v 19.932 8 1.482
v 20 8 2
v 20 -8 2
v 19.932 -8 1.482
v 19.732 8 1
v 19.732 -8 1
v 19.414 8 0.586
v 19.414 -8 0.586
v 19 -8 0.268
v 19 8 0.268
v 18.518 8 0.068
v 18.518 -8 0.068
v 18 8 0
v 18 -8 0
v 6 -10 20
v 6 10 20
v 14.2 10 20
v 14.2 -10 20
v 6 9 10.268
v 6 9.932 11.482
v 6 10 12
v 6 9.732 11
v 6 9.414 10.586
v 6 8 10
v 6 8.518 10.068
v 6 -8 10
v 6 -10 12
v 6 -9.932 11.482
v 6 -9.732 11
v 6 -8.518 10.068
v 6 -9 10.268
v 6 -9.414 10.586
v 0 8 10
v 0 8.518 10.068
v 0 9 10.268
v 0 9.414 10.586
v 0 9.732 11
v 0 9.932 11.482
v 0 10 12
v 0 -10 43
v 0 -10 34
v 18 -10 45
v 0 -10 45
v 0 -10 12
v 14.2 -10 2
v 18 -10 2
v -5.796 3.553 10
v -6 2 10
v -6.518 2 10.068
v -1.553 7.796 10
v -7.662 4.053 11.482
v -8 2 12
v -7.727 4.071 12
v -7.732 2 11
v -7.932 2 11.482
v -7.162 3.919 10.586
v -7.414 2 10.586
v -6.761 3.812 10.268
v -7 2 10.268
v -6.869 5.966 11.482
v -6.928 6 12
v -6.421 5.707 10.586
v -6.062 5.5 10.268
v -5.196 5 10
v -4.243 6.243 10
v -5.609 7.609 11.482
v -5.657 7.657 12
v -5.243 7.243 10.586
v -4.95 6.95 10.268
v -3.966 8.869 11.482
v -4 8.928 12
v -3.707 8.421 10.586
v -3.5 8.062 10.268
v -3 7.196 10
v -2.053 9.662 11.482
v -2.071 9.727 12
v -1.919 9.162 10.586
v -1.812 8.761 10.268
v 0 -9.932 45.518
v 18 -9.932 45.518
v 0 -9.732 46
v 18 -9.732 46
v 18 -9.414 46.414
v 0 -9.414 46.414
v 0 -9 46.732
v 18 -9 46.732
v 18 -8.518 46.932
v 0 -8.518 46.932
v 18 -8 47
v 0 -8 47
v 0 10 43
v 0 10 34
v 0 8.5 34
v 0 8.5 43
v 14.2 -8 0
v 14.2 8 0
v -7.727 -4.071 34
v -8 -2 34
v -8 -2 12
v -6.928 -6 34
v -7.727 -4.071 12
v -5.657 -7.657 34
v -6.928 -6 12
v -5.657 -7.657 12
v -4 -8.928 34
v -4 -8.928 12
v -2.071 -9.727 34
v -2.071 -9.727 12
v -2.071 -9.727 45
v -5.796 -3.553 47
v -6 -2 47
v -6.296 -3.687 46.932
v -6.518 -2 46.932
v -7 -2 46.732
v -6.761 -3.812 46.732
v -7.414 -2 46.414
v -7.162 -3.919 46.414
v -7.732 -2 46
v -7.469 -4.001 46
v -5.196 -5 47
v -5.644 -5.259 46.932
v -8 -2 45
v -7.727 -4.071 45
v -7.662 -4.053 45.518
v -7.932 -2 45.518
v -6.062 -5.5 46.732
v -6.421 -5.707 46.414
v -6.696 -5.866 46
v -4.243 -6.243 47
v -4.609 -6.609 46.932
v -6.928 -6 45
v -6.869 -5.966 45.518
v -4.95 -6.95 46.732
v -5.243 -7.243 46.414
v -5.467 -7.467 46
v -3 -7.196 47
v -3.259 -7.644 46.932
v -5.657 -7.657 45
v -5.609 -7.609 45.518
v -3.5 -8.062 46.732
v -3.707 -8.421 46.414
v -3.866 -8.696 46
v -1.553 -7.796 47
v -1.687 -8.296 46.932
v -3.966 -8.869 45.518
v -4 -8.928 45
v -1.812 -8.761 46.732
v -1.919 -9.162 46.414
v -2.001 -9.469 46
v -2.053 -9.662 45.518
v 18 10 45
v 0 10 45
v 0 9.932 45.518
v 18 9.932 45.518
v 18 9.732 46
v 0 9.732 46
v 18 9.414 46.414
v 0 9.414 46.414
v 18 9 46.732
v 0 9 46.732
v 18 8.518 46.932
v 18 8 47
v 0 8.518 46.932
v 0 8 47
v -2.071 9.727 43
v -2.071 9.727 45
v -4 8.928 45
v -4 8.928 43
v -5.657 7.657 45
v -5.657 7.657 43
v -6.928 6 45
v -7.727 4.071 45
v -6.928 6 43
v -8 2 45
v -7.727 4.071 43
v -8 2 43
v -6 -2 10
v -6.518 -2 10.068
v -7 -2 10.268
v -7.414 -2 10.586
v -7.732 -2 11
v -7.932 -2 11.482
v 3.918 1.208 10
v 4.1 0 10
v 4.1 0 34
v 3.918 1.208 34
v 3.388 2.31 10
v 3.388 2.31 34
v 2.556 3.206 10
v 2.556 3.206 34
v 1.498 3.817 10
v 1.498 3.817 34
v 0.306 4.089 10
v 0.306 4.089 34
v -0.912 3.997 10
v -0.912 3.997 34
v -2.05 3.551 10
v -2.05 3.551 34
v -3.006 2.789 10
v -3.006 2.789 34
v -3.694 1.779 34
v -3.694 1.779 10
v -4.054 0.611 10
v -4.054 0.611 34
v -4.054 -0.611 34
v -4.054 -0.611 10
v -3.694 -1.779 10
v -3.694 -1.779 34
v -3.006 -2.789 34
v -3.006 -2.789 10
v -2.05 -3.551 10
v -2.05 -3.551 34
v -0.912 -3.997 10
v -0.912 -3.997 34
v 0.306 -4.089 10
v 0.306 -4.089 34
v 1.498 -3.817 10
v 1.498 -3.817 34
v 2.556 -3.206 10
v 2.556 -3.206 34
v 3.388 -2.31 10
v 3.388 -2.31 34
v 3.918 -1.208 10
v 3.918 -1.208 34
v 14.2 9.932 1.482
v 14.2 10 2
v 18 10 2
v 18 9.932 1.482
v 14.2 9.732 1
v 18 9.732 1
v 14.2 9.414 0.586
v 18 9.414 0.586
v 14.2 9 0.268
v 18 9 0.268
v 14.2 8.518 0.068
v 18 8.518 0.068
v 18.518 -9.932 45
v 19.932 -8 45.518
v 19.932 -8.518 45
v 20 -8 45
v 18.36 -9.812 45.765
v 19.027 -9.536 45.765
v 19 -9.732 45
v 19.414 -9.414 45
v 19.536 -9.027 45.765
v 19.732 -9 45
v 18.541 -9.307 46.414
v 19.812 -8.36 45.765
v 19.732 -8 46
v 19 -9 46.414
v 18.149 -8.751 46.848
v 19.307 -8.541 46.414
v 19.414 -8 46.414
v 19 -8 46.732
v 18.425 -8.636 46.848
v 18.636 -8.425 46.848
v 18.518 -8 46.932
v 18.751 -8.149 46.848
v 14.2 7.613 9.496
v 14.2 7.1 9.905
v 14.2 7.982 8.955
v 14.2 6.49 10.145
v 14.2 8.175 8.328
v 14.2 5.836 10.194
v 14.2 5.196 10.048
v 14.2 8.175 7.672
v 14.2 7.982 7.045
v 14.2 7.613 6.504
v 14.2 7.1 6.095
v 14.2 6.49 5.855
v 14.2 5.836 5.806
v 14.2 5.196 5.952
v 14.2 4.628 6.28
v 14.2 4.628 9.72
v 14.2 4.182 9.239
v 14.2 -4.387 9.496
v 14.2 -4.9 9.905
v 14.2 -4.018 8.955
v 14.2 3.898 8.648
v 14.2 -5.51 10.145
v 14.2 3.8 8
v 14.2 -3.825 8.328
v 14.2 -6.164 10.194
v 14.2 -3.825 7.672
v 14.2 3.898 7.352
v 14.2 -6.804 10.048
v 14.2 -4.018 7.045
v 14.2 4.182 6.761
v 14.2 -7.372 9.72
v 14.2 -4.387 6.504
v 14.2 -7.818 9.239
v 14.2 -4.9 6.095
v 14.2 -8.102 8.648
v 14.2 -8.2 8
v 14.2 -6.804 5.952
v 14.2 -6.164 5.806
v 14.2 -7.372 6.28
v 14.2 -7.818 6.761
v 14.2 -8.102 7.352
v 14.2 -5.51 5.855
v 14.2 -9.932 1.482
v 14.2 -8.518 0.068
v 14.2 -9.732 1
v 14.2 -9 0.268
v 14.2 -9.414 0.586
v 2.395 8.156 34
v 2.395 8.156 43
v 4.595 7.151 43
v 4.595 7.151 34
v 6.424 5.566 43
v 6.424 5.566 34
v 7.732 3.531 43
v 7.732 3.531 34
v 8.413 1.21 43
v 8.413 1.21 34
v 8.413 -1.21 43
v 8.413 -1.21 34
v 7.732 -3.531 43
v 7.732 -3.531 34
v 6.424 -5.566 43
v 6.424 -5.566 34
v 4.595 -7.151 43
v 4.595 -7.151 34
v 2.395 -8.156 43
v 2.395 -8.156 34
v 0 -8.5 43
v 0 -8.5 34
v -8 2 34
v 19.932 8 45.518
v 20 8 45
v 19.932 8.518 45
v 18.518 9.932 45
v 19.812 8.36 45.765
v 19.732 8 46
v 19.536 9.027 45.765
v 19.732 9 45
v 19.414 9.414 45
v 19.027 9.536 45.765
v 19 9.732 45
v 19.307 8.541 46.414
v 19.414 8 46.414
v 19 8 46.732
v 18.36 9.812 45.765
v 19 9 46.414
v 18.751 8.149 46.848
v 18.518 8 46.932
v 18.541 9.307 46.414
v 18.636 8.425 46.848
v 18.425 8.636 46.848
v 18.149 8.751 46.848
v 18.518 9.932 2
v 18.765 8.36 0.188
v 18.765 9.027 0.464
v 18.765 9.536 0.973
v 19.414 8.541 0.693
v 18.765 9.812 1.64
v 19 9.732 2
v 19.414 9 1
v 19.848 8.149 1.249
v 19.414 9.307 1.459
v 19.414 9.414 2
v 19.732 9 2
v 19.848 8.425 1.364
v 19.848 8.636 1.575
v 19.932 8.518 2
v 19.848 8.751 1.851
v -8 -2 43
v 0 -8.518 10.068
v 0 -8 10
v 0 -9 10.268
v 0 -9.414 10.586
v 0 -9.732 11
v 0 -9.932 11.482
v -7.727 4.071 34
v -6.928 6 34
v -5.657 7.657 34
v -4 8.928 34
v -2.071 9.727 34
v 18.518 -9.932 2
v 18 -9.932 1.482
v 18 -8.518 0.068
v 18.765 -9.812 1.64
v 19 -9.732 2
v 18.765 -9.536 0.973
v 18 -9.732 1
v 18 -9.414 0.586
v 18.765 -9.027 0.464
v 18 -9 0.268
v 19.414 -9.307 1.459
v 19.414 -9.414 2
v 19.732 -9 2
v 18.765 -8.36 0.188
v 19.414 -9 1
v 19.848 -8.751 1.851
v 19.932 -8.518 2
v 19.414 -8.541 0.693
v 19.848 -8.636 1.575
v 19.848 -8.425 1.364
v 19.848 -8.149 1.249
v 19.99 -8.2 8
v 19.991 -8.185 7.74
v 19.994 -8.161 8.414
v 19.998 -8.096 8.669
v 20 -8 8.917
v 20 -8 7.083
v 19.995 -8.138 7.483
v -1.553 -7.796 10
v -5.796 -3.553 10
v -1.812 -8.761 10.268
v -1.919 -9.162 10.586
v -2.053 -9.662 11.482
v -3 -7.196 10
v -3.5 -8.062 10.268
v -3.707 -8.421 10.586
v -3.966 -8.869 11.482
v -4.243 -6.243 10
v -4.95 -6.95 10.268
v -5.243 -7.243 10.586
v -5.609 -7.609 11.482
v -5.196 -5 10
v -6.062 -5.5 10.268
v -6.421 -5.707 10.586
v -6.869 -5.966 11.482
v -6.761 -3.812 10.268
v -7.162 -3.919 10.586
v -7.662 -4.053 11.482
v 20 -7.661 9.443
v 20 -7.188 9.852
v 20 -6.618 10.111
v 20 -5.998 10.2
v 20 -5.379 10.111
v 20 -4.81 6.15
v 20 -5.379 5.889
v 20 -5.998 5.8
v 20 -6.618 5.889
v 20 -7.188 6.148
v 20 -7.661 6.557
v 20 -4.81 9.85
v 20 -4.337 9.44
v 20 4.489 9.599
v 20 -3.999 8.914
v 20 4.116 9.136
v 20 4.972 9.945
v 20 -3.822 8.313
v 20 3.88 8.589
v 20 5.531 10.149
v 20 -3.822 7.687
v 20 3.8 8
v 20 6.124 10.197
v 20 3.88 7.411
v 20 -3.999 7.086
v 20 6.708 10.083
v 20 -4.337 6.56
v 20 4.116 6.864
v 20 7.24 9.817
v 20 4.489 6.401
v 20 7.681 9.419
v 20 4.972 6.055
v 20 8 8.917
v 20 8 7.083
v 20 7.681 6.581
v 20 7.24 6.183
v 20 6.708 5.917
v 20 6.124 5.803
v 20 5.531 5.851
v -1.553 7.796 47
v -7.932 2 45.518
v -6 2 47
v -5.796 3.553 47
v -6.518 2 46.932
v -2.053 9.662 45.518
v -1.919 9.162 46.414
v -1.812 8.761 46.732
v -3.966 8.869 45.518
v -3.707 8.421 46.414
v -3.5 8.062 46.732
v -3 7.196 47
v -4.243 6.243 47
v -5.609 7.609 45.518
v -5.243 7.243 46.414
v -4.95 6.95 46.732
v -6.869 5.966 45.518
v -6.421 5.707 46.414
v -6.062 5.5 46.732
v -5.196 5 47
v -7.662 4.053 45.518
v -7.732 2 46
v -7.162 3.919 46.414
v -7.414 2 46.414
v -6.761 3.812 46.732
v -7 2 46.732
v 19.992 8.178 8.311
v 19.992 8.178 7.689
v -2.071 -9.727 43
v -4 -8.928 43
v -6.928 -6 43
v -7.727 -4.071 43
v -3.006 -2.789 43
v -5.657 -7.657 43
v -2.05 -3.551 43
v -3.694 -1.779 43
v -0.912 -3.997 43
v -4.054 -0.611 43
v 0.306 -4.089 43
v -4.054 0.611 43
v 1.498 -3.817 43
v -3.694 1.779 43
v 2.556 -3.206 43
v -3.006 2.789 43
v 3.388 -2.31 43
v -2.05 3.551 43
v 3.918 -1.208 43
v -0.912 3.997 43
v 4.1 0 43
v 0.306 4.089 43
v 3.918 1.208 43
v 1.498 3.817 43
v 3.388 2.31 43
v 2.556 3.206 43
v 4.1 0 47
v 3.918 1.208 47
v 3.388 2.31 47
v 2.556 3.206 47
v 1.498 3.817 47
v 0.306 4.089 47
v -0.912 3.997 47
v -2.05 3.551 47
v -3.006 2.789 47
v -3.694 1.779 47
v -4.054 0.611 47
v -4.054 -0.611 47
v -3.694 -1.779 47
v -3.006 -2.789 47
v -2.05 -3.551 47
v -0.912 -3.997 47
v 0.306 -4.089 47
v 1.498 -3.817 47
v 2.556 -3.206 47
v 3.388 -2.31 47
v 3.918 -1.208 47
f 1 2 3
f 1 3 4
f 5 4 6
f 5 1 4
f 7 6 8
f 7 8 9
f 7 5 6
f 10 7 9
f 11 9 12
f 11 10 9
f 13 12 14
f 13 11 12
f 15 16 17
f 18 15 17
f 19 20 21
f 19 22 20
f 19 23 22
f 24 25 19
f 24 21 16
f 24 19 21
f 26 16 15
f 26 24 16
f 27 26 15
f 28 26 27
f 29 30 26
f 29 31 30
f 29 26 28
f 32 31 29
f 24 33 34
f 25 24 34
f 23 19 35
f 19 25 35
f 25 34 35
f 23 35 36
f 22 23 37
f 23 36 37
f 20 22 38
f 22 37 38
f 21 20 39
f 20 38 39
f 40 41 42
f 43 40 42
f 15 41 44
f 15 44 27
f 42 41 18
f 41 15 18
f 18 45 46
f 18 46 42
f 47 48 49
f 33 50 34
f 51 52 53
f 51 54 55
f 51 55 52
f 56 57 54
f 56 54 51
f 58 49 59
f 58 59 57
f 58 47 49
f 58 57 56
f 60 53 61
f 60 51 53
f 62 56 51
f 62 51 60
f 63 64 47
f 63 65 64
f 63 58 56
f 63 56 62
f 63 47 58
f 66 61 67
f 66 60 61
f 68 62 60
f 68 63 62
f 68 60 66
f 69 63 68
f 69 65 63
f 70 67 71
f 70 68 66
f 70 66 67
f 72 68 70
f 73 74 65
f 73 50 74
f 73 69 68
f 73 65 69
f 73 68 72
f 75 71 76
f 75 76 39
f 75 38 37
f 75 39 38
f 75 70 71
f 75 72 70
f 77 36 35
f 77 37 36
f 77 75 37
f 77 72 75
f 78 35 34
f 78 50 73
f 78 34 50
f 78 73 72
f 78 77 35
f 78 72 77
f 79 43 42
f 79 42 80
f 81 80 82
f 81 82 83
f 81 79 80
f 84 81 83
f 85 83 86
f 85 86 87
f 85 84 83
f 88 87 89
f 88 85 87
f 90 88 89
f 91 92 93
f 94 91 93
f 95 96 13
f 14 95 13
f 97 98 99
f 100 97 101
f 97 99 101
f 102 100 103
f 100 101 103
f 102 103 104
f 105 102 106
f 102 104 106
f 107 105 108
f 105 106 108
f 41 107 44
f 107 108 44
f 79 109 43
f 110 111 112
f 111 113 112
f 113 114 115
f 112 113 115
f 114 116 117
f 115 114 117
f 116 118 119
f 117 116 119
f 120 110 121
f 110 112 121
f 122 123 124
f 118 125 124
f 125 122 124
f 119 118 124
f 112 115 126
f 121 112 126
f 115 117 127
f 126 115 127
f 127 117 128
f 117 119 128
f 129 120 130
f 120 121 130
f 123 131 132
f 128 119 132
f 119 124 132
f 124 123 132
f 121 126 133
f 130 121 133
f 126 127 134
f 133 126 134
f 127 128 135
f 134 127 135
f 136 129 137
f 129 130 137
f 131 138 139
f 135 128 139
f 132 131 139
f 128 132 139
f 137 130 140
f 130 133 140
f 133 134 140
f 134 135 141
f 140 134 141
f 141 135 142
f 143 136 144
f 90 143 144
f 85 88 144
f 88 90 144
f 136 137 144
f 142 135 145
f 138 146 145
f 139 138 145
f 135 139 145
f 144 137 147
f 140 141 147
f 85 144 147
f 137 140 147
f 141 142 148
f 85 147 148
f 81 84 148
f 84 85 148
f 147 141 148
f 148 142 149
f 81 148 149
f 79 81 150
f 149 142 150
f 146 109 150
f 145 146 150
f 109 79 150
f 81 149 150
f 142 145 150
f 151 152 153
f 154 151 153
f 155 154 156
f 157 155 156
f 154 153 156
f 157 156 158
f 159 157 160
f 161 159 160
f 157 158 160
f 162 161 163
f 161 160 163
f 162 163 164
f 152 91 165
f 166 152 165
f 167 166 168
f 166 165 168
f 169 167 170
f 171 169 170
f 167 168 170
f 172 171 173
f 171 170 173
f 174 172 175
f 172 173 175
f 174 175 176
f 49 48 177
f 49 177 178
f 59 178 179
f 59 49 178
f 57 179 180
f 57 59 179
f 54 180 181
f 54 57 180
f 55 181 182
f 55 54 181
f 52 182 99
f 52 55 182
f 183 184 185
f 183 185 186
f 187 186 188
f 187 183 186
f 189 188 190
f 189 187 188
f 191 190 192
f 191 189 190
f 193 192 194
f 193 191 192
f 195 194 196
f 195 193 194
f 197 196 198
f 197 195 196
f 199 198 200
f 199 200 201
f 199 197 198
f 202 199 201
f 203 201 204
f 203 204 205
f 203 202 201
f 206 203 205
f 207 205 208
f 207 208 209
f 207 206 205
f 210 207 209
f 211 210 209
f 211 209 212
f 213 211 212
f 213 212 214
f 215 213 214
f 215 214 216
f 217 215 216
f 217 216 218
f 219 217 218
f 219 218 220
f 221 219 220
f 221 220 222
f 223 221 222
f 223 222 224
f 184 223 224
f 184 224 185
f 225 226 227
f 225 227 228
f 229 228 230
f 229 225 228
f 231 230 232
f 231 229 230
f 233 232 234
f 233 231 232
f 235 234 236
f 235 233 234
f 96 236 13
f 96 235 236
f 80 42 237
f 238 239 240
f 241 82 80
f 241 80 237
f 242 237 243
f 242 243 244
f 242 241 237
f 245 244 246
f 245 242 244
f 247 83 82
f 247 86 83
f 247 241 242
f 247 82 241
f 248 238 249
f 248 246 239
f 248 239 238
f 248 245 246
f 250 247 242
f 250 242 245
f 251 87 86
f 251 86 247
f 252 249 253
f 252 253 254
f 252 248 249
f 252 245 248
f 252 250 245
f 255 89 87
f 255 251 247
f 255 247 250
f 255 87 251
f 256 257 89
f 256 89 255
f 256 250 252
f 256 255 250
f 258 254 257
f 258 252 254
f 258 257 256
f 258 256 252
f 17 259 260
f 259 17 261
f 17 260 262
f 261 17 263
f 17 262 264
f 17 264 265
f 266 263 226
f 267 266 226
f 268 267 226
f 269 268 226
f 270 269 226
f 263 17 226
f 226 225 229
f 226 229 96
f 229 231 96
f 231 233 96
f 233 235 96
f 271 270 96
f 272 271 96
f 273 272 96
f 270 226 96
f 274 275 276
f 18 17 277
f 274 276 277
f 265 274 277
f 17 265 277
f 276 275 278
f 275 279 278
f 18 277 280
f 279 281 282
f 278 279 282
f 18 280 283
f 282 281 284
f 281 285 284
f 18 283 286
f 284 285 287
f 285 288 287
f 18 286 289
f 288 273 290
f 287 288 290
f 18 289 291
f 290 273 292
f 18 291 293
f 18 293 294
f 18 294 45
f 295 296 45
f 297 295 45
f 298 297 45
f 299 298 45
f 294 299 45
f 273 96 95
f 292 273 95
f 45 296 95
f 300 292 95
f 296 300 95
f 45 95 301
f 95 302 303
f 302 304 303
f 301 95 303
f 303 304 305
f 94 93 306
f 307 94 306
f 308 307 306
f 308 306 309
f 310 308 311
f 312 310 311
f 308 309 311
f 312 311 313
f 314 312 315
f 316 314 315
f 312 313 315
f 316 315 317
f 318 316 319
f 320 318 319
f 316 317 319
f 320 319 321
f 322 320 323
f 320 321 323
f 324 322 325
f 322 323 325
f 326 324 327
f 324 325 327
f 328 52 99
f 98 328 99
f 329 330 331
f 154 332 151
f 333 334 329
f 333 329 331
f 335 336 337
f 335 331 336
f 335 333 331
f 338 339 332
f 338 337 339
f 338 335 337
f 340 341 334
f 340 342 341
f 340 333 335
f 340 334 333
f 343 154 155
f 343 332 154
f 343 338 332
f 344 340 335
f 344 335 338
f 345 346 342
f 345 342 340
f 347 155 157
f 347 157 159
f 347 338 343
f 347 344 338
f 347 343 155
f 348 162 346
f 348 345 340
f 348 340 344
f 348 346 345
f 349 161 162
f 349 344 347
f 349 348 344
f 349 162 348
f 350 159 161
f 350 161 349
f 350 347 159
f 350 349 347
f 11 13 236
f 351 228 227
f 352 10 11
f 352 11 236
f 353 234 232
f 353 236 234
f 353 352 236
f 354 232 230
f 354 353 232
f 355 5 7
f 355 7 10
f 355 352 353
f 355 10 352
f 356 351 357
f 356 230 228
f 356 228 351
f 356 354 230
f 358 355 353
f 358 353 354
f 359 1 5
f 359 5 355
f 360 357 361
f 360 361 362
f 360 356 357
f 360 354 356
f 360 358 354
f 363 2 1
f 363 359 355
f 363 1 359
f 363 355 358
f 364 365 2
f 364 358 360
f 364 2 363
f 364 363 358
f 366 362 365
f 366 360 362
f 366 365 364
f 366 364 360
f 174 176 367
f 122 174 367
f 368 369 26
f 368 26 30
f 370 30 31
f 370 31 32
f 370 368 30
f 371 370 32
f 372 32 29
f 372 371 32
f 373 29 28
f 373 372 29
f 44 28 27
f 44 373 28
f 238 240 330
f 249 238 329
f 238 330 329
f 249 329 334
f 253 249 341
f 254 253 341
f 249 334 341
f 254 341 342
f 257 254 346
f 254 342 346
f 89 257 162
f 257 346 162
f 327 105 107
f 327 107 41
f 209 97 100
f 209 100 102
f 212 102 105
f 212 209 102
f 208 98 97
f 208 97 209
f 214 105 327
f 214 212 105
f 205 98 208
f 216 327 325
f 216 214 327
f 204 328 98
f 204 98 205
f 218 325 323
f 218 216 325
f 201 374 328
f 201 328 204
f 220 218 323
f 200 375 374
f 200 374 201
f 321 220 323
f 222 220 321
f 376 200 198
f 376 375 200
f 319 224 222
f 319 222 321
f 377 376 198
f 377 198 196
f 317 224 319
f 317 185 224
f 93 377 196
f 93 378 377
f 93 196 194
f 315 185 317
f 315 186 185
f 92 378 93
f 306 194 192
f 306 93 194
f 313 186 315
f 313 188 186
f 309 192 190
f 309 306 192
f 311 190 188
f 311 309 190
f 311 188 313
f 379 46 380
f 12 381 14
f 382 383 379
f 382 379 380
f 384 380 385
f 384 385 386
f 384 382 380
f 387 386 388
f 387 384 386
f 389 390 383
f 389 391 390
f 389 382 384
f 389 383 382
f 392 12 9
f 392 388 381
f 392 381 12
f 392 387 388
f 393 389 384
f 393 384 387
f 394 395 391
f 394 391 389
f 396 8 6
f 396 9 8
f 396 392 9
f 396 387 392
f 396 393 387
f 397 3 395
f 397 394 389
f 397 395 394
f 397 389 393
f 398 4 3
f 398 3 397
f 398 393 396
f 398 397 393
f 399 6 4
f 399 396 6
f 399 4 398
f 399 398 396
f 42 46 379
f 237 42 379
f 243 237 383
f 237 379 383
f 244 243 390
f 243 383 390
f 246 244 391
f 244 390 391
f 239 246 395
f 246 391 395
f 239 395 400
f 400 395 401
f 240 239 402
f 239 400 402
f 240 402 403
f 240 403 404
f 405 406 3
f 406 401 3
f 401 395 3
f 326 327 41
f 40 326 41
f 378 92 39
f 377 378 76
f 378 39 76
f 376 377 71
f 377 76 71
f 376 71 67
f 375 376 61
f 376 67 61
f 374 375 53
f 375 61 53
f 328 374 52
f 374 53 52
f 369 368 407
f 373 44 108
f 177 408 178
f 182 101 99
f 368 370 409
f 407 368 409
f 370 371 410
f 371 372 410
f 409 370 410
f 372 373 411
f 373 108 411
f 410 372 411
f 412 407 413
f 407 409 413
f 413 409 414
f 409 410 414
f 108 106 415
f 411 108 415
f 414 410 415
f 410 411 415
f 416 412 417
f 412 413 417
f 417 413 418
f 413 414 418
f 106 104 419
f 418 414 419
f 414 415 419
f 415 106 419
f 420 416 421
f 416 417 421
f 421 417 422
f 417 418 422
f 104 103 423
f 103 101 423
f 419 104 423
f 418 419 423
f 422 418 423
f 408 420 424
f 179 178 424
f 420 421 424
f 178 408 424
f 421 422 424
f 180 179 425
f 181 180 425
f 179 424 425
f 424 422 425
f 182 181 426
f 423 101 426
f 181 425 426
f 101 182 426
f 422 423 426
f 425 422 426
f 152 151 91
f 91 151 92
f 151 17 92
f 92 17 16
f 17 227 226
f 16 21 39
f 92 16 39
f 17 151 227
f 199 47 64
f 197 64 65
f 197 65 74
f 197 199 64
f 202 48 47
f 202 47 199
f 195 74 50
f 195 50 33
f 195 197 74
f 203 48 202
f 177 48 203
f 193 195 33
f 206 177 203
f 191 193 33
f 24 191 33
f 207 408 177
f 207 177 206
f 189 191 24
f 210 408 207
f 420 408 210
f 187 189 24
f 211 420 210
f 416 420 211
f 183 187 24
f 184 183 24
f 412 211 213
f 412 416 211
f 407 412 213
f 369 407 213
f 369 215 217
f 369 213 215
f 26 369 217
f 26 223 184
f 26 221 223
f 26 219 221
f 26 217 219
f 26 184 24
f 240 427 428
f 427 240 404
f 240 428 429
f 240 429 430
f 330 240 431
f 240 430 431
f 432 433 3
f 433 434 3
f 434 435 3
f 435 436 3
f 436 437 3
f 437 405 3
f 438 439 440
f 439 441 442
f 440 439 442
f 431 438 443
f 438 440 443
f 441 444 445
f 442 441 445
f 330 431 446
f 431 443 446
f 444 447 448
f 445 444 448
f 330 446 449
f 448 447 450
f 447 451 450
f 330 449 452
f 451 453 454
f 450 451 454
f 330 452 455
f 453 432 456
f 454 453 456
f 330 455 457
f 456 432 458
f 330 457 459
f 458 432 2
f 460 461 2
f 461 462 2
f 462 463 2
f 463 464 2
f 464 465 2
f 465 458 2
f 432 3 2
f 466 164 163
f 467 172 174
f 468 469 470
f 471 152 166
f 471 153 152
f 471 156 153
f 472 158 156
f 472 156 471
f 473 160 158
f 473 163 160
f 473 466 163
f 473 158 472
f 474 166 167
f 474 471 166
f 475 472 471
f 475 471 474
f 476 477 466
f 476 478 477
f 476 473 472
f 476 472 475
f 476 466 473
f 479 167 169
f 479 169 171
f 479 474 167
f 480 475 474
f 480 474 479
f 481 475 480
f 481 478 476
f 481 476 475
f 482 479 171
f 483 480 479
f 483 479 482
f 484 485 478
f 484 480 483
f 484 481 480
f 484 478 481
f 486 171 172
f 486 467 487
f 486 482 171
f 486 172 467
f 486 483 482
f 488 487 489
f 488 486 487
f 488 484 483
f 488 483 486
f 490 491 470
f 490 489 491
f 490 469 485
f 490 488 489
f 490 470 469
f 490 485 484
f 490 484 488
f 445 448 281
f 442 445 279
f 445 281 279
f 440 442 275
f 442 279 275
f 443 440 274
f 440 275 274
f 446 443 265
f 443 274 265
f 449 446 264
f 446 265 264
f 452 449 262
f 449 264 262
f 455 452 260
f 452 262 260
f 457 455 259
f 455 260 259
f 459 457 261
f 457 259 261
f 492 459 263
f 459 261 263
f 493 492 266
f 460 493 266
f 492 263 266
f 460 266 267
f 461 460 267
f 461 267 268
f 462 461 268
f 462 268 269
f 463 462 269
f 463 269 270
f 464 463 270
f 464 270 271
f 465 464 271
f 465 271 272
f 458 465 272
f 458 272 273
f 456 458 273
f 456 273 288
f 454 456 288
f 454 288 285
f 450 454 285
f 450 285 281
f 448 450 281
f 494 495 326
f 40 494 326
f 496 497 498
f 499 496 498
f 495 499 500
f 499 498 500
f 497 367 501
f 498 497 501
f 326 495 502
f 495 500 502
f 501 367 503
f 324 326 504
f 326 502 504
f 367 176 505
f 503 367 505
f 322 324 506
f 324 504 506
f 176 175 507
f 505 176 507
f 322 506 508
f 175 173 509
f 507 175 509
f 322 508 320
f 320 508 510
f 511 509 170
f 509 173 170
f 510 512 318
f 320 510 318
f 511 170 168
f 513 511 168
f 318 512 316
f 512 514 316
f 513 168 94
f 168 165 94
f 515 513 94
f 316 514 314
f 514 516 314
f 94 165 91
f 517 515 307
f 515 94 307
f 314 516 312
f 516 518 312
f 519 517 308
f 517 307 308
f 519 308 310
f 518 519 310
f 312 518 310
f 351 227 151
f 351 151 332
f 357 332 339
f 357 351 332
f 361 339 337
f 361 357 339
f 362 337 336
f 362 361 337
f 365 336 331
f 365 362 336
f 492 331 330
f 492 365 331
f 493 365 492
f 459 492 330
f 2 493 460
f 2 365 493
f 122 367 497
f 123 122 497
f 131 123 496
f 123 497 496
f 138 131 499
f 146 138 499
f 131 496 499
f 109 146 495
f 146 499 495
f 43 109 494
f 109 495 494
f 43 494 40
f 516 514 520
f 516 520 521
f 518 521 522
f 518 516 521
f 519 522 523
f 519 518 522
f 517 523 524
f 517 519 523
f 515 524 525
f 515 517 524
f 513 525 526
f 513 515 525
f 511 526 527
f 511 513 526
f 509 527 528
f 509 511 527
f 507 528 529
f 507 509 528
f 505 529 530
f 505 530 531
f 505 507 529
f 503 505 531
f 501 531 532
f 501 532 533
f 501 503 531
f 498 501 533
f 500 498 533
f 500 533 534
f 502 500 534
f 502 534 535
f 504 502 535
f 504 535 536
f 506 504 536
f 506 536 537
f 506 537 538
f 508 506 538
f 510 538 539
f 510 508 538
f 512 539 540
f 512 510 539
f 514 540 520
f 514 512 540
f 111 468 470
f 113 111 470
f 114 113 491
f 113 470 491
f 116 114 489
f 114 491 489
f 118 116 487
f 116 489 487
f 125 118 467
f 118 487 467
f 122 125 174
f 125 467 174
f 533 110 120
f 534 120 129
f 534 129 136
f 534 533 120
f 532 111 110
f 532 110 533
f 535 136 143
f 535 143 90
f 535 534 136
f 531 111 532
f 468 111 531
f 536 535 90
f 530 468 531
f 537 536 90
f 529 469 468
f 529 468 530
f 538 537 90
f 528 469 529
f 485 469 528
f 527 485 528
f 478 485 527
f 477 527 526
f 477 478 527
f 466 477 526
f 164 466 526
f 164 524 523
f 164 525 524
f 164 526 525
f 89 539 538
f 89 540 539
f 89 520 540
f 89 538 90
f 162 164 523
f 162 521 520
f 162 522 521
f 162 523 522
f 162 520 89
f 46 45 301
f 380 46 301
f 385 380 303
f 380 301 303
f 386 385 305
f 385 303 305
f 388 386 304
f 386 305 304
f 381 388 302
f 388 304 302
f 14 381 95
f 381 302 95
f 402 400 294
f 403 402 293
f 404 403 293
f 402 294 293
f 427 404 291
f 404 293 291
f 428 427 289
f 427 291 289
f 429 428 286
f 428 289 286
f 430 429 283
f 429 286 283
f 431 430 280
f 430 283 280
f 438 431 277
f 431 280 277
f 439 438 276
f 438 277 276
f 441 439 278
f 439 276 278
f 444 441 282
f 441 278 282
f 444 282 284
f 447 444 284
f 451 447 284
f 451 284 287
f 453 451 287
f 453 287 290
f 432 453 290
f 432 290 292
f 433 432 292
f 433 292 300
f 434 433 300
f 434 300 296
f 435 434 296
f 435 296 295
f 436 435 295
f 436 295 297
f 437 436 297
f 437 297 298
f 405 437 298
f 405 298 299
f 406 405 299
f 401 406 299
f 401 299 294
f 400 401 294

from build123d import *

# Parameters (mm, degrees)
F0_R          = 4.1
F1_DEPTH      = 34
F3_DEPTH      = 9
F4_R          = 4.1
F5_DEPTH      = 4
F6_W          = 8.2
F6_H          = 20
F7_DEPTH      = 20
F8_W          = 15.1884564608
F8_H          = 21.6641027853
F9_DEPTH      = 10
F10_R         = 2.2
F11_DEPTH     = 25
F12_T1_DEPTH  = 8.8
F12_T3_DEPTH  = 18
F12_T5_DEPTH  = 16
F12_T7_DEPTH  = 43
F12_T9_DEPTH  = 4
F12_T11_DEPTH = 11
F12_S15_W     = 2
F12_S15_H     = 2
F12_T16_DEPTH = 2
F12_S21_W     = 2
F12_S21_H     = 2
F12_T22_DEPTH = 2
F12_S27_W     = 2
F12_S27_H     = 2
F12_T28_DEPTH = 2
F12_S33_W     = 2
F12_S33_H     = 2
F12_T34_DEPTH = 2
F12_T38_ANGLE = 90
F12_T40_ANGLE = 90
F12_T42_ANGLE = 90
F12_T44_ANGLE = 90


# Not quite as in the source:
# - a fillet or chamfer that OpenCascade refuses, or shapes differently, is made with other operations: its cross-section is extruded or revolved along the edge and cut away or added


with BuildPart() as f1:
    # F0 (on Top) → F1 (new body)
    with BuildSketch(Plane.XY):
        with BuildLine():
            ThreePointArc((-8, -2), (-5.6568542495, -7.6568542495), (0, -10))
            Line((0, -10), (20, -10))
            Line((20, -10), (20, 10))
            Line((20, 10), (0, 10))
            ThreePointArc((0, 10), (-5.6568542495, 7.6568542495), (-8, 2))
            Line((-8, 2), (-8, -2))
        make_face()
        Circle(F0_R, mode=Mode.SUBTRACT)
    extrude(amount=F1_DEPTH)

    # F2 (on face) → F3 (join)
    with BuildSketch(Plane.XY.offset(34)):
        with BuildLine():
            Line((0, 10), (0, 8.5))
            ThreePointArc((0, 8.5), (8.5, 0), (0, -8.5))
            Line((0, -8.5), (0, -10))
            Line((0, -10), (20, -10))
            Line((20, -10), (20, 10))
            Line((20, 10), (0, 10))
        make_face()
    extrude(amount=F3_DEPTH)

    # F4 (on face) → F5 (join)
    with BuildSketch(Plane.XY.offset(43)):
        with BuildLine():
            Line((20, -10), (20, 10))
            Line((20, 10), (0, 10))
            ThreePointArc((0, 10), (-5.6568542495, 7.6568542495), (-8, 2))
            Line((-8, 2), (-8, -2))
            ThreePointArc((-8, -2), (-5.6568542495, -7.6568542495), (0, -10))
            Line((0, -10), (20, -10))
        make_face()
        Circle(F4_R, mode=Mode.SUBTRACT)
    extrude(amount=F5_DEPTH)

    # F6 (on face) → F7 (cut)
    with BuildSketch(Plane(origin=(0, 0, 0), x_dir=(1, 0, 0), z_dir=(0, 0, -1))):
        with Locations((10.1, 0)):
            Rectangle(F6_W, F6_H)
    extrude(amount=-F7_DEPTH, mode=Mode.SUBTRACT)

    # F8 (on face) → F9 (cut)
    with BuildSketch(Plane(origin=(0, 0, 0), x_dir=(1, 0, 0), z_dir=(0, 0, -1))):
        with Locations((-1.5942282304, 0.8320513926)):
            Rectangle(F8_W, F8_H)
    extrude(amount=-F9_DEPTH, mode=Mode.SUBTRACT)

    # F10 (on face) → F11 (cut)
    with BuildSketch(Plane(origin=(14.2, 0, 0), x_dir=(0, -1, 0), z_dir=(-1, 0, 0))):
        with Locations((6, 8)):
            Circle(F10_R)
        with Locations((-6, 8)):
            Circle(F10_R)
    extrude(amount=-F11_DEPTH, mode=Mode.SUBTRACT)

    # F12: fillet of radius 2 on 16 edges, made by hand

    # F12_s2 → F12_t1 (cut)
    with BuildSketch(Plane.YZ.offset(9.2)):
        with BuildLine():
            ThreePointArc((10, 2), (9.4142135624, 0.5857864376), (8, 0))
            Line((8, 0), (10, 0))
            Line((10, 0), (10, 2))
        make_face()
        with BuildLine():
            ThreePointArc((-10, 2), (-9.4142135624, 0.5857864376), (-8, 0))
            Line((-8, 0), (-10, 0))
            Line((-10, 0), (-10, 2))
        make_face()
    extrude(amount=F12_T1_DEPTH, mode=Mode.SUBTRACT)

    # F12_s4 → F12_t3 (cut)
    with BuildSketch(Plane.YZ):
        with BuildLine():
            ThreePointArc((10, 45), (9.4142135624, 46.4142135624), (8, 47))
            Line((8, 47), (10, 47))
            Line((10, 47), (10, 45))
        make_face()
        with BuildLine():
            ThreePointArc((-10, 45), (-9.4142135624, 46.4142135624), (-8, 47))
            Line((-8, 47), (-10, 47))
            Line((-10, 47), (-10, 45))
        make_face()
    extrude(amount=F12_T3_DEPTH, mode=Mode.SUBTRACT)

    # F12_s6 → F12_t5 (cut)
    with BuildSketch(Plane.XZ.offset(-8)):
        with BuildLine():
            ThreePointArc((20, 45), (19.4142135624, 46.4142135624), (18, 47))
            Line((18, 47), (20, 47))
            Line((20, 47), (20, 45))
        make_face()
        with BuildLine():
            ThreePointArc((20, 2), (19.4142135624, 0.5857864376), (18, 0))
            Line((18, 0), (20, 0))
            Line((20, 0), (20, 2))
        make_face()
    extrude(amount=F12_T5_DEPTH, mode=Mode.SUBTRACT)

    # F12_s8 → F12_t7 (cut)
    with BuildSketch(Plane.XY.offset(2)):
        with BuildLine():
            ThreePointArc((18, 10), (19.4142135624, 9.4142135624), (20, 8))
            Line((20, 8), (20, 10))
            Line((20, 10), (18, 10))
        make_face()
        with BuildLine():
            ThreePointArc((18, -10), (19.4142135624, -9.4142135624), (20, -8))
            Line((20, -8), (20, -10))
            Line((20, -10), (18, -10))
        make_face()
    extrude(amount=F12_T7_DEPTH, mode=Mode.SUBTRACT)

    # F12_s10 → F12_t9 (cut)
    with BuildSketch(Plane.XZ.offset(-2)):
        with BuildLine():
            ThreePointArc((-6, 10), (-7.4142135624, 10.5857864376), (-8, 12))
            Line((-8, 12), (-8, 10))
            Line((-8, 10), (-6, 10))
        make_face()
        with BuildLine():
            ThreePointArc((-6, 47), (-7.4142135624, 46.4142135624), (-8, 45))
            Line((-8, 45), (-8, 47))
            Line((-8, 47), (-6, 47))
        make_face()
    extrude(amount=F12_T9_DEPTH, mode=Mode.SUBTRACT)

    # F12_s12 → F12_t11 (cut)
    with BuildSketch(Plane.YZ):
        with BuildLine():
            ThreePointArc((-8, 10), (-9.4142135624, 10.5857864376), (-10, 12))
            Line((-10, 12), (-10, 10))
            Line((-10, 10), (-8, 10))
        make_face()
        with BuildLine():
            ThreePointArc((8, 10), (9.4142135624, 10.5857864376), (10, 12))
            Line((10, 12), (10, 10))
            Line((10, 10), (8, 10))
        make_face()
    extrude(amount=F12_T11_DEPTH, mode=Mode.SUBTRACT)


with BuildPart() as f12_tool14:
    # F12_s15 → F12_t16 (new body)
    with BuildSketch(Plane.YZ.offset(18)):
        with Locations((9, 1)):
            Rectangle(F12_S15_W, F12_S15_H)
    extrude(amount=F12_T16_DEPTH)

    # F12_s17 → F12_t18 (revolve, cut)
    with BuildSketch(Plane(origin=(18, 8, 2), x_dir=(0, -0.7071067812, 0.7071067812), z_dir=(0, 0.7071067812, 0.7071067812))):
        with BuildLine():
            ThreePointArc((0, -2), (2, 0), (0, 2))
            Line((0, 2), (0, -2))
        make_face()
    revolve(axis=Axis((18, 8, 2), (1, 0, 0)), mode=Mode.SUBTRACT)


with BuildPart() as f1_1:
    add(f1.part)

    # F12_t13: cut F12_tool14
    add(f12_tool14.part, mode=Mode.SUBTRACT)


with BuildPart() as f12_tool20:
    # F12_s21 → F12_t22 (new body)
    with BuildSketch(Plane.XY.offset(45)):
        with Locations((19, 9)):
            Rectangle(F12_S21_W, F12_S21_H)
    extrude(amount=F12_T22_DEPTH)

    # F12_s23 → F12_t24 (revolve, cut)
    with BuildSketch(Plane(origin=(18, 8, 45), x_dir=(-0.7071067812, -0.7071067812, 0), z_dir=(-0.7071067812, 0.7071067812, 0))):
        with BuildLine():
            ThreePointArc((0, -2), (2, 0), (0, 2))
            Line((0, 2), (0, -2))
        make_face()
    revolve(axis=Axis((18, 8, 45), (0, 0, 1)), mode=Mode.SUBTRACT)


with BuildPart() as f1_2:
    add(f1_1.part)

    # F12_t19: cut F12_tool20
    add(f12_tool20.part, mode=Mode.SUBTRACT)


with BuildPart() as f12_tool26:
    # F12_s27 → F12_t28 (new body)
    with BuildSketch(Plane.XY.offset(45)):
        with Locations((19, -9)):
            Rectangle(F12_S27_W, F12_S27_H)
    extrude(amount=F12_T28_DEPTH)

    # F12_s29 → F12_t30 (revolve, cut)
    with BuildSketch(Plane(origin=(18, -8, 45), x_dir=(-0.7071067812, 0.7071067812, 0), z_dir=(0.7071067812, 0.7071067812, 0))):
        with BuildLine():
            ThreePointArc((0, -2), (2, 0), (0, 2))
            Line((0, 2), (0, -2))
        make_face()
    revolve(axis=Axis((18, -8, 45), (0, 0, 1)), mode=Mode.SUBTRACT)


with BuildPart() as f1_3:
    add(f1_2.part)

    # F12_t25: cut F12_tool26
    add(f12_tool26.part, mode=Mode.SUBTRACT)


with BuildPart() as f12_tool32:
    # F12_s33 → F12_t34 (new body)
    with BuildSketch(Plane.YZ.offset(18)):
        with Locations((-9, 1)):
            Rectangle(F12_S33_W, F12_S33_H)
    extrude(amount=F12_T34_DEPTH)

    # F12_s35 → F12_t36 (revolve, cut)
    with BuildSketch(Plane(origin=(18, -8, 2), x_dir=(0, 0.7071067812, 0.7071067812), z_dir=(0, 0.7071067812, -0.7071067812))):
        with BuildLine():
            ThreePointArc((0, -2), (2, 0), (0, 2))
            Line((0, 2), (0, -2))
        make_face()
    revolve(axis=Axis((18, -8, 2), (1, 0, 0)), mode=Mode.SUBTRACT)


with BuildPart() as f1_4:
    add(f1_3.part)

    # F12_t31: cut F12_tool32
    add(f12_tool32.part, mode=Mode.SUBTRACT)

    # F12_s37 → F12_t38 (revolve, cut)
    with BuildSketch(Plane.YZ):
        with BuildLine():
            ThreePointArc((-8, 10), (-9.4142135624, 10.5857864376), (-10, 12))
            Line((-10, 12), (-10, 10))
            Line((-10, 10), (-8, 10))
        make_face()
    revolve(axis=Axis((0, -2, 10), (0, 0, -1)), revolution_arc=F12_T38_ANGLE, mode=Mode.SUBTRACT)

    # F12_s39 → F12_t40 (revolve, cut)
    with BuildSketch(Plane.XZ.offset(-2)):
        with BuildLine():
            ThreePointArc((-8, 12), (-7.4142135624, 10.5857864376), (-6, 10))
            Line((-6, 10), (-8, 10))
            Line((-8, 10), (-8, 12))
        make_face()
    revolve(axis=Axis((0, 2, 10), (0, 0, -1)), revolution_arc=F12_T40_ANGLE, mode=Mode.SUBTRACT)

    # F12_s41 → F12_t42 (revolve, cut)
    with BuildSketch(Plane.YZ):
        with BuildLine():
            ThreePointArc((10, 45), (9.4142135624, 46.4142135624), (8, 47))
            Line((8, 47), (10, 47))
            Line((10, 47), (10, 45))
        make_face()
    revolve(axis=Axis((0, 2, 47), (0, 0, 1)), revolution_arc=F12_T42_ANGLE, mode=Mode.SUBTRACT)

    # F12_s43 → F12_t44 (revolve, cut)
    with BuildSketch(Plane.XZ.offset(2)):
        with BuildLine():
            ThreePointArc((-6, 47), (-7.4142135624, 46.4142135624), (-8, 45))
            Line((-8, 45), (-8, 47))
            Line((-8, 47), (-6, 47))
        make_face()
    revolve(axis=Axis((0, -2, 47), (0, 0, 1)), revolution_arc=F12_T44_ANGLE, mode=Mode.SUBTRACT)


solid = f1_4.part
